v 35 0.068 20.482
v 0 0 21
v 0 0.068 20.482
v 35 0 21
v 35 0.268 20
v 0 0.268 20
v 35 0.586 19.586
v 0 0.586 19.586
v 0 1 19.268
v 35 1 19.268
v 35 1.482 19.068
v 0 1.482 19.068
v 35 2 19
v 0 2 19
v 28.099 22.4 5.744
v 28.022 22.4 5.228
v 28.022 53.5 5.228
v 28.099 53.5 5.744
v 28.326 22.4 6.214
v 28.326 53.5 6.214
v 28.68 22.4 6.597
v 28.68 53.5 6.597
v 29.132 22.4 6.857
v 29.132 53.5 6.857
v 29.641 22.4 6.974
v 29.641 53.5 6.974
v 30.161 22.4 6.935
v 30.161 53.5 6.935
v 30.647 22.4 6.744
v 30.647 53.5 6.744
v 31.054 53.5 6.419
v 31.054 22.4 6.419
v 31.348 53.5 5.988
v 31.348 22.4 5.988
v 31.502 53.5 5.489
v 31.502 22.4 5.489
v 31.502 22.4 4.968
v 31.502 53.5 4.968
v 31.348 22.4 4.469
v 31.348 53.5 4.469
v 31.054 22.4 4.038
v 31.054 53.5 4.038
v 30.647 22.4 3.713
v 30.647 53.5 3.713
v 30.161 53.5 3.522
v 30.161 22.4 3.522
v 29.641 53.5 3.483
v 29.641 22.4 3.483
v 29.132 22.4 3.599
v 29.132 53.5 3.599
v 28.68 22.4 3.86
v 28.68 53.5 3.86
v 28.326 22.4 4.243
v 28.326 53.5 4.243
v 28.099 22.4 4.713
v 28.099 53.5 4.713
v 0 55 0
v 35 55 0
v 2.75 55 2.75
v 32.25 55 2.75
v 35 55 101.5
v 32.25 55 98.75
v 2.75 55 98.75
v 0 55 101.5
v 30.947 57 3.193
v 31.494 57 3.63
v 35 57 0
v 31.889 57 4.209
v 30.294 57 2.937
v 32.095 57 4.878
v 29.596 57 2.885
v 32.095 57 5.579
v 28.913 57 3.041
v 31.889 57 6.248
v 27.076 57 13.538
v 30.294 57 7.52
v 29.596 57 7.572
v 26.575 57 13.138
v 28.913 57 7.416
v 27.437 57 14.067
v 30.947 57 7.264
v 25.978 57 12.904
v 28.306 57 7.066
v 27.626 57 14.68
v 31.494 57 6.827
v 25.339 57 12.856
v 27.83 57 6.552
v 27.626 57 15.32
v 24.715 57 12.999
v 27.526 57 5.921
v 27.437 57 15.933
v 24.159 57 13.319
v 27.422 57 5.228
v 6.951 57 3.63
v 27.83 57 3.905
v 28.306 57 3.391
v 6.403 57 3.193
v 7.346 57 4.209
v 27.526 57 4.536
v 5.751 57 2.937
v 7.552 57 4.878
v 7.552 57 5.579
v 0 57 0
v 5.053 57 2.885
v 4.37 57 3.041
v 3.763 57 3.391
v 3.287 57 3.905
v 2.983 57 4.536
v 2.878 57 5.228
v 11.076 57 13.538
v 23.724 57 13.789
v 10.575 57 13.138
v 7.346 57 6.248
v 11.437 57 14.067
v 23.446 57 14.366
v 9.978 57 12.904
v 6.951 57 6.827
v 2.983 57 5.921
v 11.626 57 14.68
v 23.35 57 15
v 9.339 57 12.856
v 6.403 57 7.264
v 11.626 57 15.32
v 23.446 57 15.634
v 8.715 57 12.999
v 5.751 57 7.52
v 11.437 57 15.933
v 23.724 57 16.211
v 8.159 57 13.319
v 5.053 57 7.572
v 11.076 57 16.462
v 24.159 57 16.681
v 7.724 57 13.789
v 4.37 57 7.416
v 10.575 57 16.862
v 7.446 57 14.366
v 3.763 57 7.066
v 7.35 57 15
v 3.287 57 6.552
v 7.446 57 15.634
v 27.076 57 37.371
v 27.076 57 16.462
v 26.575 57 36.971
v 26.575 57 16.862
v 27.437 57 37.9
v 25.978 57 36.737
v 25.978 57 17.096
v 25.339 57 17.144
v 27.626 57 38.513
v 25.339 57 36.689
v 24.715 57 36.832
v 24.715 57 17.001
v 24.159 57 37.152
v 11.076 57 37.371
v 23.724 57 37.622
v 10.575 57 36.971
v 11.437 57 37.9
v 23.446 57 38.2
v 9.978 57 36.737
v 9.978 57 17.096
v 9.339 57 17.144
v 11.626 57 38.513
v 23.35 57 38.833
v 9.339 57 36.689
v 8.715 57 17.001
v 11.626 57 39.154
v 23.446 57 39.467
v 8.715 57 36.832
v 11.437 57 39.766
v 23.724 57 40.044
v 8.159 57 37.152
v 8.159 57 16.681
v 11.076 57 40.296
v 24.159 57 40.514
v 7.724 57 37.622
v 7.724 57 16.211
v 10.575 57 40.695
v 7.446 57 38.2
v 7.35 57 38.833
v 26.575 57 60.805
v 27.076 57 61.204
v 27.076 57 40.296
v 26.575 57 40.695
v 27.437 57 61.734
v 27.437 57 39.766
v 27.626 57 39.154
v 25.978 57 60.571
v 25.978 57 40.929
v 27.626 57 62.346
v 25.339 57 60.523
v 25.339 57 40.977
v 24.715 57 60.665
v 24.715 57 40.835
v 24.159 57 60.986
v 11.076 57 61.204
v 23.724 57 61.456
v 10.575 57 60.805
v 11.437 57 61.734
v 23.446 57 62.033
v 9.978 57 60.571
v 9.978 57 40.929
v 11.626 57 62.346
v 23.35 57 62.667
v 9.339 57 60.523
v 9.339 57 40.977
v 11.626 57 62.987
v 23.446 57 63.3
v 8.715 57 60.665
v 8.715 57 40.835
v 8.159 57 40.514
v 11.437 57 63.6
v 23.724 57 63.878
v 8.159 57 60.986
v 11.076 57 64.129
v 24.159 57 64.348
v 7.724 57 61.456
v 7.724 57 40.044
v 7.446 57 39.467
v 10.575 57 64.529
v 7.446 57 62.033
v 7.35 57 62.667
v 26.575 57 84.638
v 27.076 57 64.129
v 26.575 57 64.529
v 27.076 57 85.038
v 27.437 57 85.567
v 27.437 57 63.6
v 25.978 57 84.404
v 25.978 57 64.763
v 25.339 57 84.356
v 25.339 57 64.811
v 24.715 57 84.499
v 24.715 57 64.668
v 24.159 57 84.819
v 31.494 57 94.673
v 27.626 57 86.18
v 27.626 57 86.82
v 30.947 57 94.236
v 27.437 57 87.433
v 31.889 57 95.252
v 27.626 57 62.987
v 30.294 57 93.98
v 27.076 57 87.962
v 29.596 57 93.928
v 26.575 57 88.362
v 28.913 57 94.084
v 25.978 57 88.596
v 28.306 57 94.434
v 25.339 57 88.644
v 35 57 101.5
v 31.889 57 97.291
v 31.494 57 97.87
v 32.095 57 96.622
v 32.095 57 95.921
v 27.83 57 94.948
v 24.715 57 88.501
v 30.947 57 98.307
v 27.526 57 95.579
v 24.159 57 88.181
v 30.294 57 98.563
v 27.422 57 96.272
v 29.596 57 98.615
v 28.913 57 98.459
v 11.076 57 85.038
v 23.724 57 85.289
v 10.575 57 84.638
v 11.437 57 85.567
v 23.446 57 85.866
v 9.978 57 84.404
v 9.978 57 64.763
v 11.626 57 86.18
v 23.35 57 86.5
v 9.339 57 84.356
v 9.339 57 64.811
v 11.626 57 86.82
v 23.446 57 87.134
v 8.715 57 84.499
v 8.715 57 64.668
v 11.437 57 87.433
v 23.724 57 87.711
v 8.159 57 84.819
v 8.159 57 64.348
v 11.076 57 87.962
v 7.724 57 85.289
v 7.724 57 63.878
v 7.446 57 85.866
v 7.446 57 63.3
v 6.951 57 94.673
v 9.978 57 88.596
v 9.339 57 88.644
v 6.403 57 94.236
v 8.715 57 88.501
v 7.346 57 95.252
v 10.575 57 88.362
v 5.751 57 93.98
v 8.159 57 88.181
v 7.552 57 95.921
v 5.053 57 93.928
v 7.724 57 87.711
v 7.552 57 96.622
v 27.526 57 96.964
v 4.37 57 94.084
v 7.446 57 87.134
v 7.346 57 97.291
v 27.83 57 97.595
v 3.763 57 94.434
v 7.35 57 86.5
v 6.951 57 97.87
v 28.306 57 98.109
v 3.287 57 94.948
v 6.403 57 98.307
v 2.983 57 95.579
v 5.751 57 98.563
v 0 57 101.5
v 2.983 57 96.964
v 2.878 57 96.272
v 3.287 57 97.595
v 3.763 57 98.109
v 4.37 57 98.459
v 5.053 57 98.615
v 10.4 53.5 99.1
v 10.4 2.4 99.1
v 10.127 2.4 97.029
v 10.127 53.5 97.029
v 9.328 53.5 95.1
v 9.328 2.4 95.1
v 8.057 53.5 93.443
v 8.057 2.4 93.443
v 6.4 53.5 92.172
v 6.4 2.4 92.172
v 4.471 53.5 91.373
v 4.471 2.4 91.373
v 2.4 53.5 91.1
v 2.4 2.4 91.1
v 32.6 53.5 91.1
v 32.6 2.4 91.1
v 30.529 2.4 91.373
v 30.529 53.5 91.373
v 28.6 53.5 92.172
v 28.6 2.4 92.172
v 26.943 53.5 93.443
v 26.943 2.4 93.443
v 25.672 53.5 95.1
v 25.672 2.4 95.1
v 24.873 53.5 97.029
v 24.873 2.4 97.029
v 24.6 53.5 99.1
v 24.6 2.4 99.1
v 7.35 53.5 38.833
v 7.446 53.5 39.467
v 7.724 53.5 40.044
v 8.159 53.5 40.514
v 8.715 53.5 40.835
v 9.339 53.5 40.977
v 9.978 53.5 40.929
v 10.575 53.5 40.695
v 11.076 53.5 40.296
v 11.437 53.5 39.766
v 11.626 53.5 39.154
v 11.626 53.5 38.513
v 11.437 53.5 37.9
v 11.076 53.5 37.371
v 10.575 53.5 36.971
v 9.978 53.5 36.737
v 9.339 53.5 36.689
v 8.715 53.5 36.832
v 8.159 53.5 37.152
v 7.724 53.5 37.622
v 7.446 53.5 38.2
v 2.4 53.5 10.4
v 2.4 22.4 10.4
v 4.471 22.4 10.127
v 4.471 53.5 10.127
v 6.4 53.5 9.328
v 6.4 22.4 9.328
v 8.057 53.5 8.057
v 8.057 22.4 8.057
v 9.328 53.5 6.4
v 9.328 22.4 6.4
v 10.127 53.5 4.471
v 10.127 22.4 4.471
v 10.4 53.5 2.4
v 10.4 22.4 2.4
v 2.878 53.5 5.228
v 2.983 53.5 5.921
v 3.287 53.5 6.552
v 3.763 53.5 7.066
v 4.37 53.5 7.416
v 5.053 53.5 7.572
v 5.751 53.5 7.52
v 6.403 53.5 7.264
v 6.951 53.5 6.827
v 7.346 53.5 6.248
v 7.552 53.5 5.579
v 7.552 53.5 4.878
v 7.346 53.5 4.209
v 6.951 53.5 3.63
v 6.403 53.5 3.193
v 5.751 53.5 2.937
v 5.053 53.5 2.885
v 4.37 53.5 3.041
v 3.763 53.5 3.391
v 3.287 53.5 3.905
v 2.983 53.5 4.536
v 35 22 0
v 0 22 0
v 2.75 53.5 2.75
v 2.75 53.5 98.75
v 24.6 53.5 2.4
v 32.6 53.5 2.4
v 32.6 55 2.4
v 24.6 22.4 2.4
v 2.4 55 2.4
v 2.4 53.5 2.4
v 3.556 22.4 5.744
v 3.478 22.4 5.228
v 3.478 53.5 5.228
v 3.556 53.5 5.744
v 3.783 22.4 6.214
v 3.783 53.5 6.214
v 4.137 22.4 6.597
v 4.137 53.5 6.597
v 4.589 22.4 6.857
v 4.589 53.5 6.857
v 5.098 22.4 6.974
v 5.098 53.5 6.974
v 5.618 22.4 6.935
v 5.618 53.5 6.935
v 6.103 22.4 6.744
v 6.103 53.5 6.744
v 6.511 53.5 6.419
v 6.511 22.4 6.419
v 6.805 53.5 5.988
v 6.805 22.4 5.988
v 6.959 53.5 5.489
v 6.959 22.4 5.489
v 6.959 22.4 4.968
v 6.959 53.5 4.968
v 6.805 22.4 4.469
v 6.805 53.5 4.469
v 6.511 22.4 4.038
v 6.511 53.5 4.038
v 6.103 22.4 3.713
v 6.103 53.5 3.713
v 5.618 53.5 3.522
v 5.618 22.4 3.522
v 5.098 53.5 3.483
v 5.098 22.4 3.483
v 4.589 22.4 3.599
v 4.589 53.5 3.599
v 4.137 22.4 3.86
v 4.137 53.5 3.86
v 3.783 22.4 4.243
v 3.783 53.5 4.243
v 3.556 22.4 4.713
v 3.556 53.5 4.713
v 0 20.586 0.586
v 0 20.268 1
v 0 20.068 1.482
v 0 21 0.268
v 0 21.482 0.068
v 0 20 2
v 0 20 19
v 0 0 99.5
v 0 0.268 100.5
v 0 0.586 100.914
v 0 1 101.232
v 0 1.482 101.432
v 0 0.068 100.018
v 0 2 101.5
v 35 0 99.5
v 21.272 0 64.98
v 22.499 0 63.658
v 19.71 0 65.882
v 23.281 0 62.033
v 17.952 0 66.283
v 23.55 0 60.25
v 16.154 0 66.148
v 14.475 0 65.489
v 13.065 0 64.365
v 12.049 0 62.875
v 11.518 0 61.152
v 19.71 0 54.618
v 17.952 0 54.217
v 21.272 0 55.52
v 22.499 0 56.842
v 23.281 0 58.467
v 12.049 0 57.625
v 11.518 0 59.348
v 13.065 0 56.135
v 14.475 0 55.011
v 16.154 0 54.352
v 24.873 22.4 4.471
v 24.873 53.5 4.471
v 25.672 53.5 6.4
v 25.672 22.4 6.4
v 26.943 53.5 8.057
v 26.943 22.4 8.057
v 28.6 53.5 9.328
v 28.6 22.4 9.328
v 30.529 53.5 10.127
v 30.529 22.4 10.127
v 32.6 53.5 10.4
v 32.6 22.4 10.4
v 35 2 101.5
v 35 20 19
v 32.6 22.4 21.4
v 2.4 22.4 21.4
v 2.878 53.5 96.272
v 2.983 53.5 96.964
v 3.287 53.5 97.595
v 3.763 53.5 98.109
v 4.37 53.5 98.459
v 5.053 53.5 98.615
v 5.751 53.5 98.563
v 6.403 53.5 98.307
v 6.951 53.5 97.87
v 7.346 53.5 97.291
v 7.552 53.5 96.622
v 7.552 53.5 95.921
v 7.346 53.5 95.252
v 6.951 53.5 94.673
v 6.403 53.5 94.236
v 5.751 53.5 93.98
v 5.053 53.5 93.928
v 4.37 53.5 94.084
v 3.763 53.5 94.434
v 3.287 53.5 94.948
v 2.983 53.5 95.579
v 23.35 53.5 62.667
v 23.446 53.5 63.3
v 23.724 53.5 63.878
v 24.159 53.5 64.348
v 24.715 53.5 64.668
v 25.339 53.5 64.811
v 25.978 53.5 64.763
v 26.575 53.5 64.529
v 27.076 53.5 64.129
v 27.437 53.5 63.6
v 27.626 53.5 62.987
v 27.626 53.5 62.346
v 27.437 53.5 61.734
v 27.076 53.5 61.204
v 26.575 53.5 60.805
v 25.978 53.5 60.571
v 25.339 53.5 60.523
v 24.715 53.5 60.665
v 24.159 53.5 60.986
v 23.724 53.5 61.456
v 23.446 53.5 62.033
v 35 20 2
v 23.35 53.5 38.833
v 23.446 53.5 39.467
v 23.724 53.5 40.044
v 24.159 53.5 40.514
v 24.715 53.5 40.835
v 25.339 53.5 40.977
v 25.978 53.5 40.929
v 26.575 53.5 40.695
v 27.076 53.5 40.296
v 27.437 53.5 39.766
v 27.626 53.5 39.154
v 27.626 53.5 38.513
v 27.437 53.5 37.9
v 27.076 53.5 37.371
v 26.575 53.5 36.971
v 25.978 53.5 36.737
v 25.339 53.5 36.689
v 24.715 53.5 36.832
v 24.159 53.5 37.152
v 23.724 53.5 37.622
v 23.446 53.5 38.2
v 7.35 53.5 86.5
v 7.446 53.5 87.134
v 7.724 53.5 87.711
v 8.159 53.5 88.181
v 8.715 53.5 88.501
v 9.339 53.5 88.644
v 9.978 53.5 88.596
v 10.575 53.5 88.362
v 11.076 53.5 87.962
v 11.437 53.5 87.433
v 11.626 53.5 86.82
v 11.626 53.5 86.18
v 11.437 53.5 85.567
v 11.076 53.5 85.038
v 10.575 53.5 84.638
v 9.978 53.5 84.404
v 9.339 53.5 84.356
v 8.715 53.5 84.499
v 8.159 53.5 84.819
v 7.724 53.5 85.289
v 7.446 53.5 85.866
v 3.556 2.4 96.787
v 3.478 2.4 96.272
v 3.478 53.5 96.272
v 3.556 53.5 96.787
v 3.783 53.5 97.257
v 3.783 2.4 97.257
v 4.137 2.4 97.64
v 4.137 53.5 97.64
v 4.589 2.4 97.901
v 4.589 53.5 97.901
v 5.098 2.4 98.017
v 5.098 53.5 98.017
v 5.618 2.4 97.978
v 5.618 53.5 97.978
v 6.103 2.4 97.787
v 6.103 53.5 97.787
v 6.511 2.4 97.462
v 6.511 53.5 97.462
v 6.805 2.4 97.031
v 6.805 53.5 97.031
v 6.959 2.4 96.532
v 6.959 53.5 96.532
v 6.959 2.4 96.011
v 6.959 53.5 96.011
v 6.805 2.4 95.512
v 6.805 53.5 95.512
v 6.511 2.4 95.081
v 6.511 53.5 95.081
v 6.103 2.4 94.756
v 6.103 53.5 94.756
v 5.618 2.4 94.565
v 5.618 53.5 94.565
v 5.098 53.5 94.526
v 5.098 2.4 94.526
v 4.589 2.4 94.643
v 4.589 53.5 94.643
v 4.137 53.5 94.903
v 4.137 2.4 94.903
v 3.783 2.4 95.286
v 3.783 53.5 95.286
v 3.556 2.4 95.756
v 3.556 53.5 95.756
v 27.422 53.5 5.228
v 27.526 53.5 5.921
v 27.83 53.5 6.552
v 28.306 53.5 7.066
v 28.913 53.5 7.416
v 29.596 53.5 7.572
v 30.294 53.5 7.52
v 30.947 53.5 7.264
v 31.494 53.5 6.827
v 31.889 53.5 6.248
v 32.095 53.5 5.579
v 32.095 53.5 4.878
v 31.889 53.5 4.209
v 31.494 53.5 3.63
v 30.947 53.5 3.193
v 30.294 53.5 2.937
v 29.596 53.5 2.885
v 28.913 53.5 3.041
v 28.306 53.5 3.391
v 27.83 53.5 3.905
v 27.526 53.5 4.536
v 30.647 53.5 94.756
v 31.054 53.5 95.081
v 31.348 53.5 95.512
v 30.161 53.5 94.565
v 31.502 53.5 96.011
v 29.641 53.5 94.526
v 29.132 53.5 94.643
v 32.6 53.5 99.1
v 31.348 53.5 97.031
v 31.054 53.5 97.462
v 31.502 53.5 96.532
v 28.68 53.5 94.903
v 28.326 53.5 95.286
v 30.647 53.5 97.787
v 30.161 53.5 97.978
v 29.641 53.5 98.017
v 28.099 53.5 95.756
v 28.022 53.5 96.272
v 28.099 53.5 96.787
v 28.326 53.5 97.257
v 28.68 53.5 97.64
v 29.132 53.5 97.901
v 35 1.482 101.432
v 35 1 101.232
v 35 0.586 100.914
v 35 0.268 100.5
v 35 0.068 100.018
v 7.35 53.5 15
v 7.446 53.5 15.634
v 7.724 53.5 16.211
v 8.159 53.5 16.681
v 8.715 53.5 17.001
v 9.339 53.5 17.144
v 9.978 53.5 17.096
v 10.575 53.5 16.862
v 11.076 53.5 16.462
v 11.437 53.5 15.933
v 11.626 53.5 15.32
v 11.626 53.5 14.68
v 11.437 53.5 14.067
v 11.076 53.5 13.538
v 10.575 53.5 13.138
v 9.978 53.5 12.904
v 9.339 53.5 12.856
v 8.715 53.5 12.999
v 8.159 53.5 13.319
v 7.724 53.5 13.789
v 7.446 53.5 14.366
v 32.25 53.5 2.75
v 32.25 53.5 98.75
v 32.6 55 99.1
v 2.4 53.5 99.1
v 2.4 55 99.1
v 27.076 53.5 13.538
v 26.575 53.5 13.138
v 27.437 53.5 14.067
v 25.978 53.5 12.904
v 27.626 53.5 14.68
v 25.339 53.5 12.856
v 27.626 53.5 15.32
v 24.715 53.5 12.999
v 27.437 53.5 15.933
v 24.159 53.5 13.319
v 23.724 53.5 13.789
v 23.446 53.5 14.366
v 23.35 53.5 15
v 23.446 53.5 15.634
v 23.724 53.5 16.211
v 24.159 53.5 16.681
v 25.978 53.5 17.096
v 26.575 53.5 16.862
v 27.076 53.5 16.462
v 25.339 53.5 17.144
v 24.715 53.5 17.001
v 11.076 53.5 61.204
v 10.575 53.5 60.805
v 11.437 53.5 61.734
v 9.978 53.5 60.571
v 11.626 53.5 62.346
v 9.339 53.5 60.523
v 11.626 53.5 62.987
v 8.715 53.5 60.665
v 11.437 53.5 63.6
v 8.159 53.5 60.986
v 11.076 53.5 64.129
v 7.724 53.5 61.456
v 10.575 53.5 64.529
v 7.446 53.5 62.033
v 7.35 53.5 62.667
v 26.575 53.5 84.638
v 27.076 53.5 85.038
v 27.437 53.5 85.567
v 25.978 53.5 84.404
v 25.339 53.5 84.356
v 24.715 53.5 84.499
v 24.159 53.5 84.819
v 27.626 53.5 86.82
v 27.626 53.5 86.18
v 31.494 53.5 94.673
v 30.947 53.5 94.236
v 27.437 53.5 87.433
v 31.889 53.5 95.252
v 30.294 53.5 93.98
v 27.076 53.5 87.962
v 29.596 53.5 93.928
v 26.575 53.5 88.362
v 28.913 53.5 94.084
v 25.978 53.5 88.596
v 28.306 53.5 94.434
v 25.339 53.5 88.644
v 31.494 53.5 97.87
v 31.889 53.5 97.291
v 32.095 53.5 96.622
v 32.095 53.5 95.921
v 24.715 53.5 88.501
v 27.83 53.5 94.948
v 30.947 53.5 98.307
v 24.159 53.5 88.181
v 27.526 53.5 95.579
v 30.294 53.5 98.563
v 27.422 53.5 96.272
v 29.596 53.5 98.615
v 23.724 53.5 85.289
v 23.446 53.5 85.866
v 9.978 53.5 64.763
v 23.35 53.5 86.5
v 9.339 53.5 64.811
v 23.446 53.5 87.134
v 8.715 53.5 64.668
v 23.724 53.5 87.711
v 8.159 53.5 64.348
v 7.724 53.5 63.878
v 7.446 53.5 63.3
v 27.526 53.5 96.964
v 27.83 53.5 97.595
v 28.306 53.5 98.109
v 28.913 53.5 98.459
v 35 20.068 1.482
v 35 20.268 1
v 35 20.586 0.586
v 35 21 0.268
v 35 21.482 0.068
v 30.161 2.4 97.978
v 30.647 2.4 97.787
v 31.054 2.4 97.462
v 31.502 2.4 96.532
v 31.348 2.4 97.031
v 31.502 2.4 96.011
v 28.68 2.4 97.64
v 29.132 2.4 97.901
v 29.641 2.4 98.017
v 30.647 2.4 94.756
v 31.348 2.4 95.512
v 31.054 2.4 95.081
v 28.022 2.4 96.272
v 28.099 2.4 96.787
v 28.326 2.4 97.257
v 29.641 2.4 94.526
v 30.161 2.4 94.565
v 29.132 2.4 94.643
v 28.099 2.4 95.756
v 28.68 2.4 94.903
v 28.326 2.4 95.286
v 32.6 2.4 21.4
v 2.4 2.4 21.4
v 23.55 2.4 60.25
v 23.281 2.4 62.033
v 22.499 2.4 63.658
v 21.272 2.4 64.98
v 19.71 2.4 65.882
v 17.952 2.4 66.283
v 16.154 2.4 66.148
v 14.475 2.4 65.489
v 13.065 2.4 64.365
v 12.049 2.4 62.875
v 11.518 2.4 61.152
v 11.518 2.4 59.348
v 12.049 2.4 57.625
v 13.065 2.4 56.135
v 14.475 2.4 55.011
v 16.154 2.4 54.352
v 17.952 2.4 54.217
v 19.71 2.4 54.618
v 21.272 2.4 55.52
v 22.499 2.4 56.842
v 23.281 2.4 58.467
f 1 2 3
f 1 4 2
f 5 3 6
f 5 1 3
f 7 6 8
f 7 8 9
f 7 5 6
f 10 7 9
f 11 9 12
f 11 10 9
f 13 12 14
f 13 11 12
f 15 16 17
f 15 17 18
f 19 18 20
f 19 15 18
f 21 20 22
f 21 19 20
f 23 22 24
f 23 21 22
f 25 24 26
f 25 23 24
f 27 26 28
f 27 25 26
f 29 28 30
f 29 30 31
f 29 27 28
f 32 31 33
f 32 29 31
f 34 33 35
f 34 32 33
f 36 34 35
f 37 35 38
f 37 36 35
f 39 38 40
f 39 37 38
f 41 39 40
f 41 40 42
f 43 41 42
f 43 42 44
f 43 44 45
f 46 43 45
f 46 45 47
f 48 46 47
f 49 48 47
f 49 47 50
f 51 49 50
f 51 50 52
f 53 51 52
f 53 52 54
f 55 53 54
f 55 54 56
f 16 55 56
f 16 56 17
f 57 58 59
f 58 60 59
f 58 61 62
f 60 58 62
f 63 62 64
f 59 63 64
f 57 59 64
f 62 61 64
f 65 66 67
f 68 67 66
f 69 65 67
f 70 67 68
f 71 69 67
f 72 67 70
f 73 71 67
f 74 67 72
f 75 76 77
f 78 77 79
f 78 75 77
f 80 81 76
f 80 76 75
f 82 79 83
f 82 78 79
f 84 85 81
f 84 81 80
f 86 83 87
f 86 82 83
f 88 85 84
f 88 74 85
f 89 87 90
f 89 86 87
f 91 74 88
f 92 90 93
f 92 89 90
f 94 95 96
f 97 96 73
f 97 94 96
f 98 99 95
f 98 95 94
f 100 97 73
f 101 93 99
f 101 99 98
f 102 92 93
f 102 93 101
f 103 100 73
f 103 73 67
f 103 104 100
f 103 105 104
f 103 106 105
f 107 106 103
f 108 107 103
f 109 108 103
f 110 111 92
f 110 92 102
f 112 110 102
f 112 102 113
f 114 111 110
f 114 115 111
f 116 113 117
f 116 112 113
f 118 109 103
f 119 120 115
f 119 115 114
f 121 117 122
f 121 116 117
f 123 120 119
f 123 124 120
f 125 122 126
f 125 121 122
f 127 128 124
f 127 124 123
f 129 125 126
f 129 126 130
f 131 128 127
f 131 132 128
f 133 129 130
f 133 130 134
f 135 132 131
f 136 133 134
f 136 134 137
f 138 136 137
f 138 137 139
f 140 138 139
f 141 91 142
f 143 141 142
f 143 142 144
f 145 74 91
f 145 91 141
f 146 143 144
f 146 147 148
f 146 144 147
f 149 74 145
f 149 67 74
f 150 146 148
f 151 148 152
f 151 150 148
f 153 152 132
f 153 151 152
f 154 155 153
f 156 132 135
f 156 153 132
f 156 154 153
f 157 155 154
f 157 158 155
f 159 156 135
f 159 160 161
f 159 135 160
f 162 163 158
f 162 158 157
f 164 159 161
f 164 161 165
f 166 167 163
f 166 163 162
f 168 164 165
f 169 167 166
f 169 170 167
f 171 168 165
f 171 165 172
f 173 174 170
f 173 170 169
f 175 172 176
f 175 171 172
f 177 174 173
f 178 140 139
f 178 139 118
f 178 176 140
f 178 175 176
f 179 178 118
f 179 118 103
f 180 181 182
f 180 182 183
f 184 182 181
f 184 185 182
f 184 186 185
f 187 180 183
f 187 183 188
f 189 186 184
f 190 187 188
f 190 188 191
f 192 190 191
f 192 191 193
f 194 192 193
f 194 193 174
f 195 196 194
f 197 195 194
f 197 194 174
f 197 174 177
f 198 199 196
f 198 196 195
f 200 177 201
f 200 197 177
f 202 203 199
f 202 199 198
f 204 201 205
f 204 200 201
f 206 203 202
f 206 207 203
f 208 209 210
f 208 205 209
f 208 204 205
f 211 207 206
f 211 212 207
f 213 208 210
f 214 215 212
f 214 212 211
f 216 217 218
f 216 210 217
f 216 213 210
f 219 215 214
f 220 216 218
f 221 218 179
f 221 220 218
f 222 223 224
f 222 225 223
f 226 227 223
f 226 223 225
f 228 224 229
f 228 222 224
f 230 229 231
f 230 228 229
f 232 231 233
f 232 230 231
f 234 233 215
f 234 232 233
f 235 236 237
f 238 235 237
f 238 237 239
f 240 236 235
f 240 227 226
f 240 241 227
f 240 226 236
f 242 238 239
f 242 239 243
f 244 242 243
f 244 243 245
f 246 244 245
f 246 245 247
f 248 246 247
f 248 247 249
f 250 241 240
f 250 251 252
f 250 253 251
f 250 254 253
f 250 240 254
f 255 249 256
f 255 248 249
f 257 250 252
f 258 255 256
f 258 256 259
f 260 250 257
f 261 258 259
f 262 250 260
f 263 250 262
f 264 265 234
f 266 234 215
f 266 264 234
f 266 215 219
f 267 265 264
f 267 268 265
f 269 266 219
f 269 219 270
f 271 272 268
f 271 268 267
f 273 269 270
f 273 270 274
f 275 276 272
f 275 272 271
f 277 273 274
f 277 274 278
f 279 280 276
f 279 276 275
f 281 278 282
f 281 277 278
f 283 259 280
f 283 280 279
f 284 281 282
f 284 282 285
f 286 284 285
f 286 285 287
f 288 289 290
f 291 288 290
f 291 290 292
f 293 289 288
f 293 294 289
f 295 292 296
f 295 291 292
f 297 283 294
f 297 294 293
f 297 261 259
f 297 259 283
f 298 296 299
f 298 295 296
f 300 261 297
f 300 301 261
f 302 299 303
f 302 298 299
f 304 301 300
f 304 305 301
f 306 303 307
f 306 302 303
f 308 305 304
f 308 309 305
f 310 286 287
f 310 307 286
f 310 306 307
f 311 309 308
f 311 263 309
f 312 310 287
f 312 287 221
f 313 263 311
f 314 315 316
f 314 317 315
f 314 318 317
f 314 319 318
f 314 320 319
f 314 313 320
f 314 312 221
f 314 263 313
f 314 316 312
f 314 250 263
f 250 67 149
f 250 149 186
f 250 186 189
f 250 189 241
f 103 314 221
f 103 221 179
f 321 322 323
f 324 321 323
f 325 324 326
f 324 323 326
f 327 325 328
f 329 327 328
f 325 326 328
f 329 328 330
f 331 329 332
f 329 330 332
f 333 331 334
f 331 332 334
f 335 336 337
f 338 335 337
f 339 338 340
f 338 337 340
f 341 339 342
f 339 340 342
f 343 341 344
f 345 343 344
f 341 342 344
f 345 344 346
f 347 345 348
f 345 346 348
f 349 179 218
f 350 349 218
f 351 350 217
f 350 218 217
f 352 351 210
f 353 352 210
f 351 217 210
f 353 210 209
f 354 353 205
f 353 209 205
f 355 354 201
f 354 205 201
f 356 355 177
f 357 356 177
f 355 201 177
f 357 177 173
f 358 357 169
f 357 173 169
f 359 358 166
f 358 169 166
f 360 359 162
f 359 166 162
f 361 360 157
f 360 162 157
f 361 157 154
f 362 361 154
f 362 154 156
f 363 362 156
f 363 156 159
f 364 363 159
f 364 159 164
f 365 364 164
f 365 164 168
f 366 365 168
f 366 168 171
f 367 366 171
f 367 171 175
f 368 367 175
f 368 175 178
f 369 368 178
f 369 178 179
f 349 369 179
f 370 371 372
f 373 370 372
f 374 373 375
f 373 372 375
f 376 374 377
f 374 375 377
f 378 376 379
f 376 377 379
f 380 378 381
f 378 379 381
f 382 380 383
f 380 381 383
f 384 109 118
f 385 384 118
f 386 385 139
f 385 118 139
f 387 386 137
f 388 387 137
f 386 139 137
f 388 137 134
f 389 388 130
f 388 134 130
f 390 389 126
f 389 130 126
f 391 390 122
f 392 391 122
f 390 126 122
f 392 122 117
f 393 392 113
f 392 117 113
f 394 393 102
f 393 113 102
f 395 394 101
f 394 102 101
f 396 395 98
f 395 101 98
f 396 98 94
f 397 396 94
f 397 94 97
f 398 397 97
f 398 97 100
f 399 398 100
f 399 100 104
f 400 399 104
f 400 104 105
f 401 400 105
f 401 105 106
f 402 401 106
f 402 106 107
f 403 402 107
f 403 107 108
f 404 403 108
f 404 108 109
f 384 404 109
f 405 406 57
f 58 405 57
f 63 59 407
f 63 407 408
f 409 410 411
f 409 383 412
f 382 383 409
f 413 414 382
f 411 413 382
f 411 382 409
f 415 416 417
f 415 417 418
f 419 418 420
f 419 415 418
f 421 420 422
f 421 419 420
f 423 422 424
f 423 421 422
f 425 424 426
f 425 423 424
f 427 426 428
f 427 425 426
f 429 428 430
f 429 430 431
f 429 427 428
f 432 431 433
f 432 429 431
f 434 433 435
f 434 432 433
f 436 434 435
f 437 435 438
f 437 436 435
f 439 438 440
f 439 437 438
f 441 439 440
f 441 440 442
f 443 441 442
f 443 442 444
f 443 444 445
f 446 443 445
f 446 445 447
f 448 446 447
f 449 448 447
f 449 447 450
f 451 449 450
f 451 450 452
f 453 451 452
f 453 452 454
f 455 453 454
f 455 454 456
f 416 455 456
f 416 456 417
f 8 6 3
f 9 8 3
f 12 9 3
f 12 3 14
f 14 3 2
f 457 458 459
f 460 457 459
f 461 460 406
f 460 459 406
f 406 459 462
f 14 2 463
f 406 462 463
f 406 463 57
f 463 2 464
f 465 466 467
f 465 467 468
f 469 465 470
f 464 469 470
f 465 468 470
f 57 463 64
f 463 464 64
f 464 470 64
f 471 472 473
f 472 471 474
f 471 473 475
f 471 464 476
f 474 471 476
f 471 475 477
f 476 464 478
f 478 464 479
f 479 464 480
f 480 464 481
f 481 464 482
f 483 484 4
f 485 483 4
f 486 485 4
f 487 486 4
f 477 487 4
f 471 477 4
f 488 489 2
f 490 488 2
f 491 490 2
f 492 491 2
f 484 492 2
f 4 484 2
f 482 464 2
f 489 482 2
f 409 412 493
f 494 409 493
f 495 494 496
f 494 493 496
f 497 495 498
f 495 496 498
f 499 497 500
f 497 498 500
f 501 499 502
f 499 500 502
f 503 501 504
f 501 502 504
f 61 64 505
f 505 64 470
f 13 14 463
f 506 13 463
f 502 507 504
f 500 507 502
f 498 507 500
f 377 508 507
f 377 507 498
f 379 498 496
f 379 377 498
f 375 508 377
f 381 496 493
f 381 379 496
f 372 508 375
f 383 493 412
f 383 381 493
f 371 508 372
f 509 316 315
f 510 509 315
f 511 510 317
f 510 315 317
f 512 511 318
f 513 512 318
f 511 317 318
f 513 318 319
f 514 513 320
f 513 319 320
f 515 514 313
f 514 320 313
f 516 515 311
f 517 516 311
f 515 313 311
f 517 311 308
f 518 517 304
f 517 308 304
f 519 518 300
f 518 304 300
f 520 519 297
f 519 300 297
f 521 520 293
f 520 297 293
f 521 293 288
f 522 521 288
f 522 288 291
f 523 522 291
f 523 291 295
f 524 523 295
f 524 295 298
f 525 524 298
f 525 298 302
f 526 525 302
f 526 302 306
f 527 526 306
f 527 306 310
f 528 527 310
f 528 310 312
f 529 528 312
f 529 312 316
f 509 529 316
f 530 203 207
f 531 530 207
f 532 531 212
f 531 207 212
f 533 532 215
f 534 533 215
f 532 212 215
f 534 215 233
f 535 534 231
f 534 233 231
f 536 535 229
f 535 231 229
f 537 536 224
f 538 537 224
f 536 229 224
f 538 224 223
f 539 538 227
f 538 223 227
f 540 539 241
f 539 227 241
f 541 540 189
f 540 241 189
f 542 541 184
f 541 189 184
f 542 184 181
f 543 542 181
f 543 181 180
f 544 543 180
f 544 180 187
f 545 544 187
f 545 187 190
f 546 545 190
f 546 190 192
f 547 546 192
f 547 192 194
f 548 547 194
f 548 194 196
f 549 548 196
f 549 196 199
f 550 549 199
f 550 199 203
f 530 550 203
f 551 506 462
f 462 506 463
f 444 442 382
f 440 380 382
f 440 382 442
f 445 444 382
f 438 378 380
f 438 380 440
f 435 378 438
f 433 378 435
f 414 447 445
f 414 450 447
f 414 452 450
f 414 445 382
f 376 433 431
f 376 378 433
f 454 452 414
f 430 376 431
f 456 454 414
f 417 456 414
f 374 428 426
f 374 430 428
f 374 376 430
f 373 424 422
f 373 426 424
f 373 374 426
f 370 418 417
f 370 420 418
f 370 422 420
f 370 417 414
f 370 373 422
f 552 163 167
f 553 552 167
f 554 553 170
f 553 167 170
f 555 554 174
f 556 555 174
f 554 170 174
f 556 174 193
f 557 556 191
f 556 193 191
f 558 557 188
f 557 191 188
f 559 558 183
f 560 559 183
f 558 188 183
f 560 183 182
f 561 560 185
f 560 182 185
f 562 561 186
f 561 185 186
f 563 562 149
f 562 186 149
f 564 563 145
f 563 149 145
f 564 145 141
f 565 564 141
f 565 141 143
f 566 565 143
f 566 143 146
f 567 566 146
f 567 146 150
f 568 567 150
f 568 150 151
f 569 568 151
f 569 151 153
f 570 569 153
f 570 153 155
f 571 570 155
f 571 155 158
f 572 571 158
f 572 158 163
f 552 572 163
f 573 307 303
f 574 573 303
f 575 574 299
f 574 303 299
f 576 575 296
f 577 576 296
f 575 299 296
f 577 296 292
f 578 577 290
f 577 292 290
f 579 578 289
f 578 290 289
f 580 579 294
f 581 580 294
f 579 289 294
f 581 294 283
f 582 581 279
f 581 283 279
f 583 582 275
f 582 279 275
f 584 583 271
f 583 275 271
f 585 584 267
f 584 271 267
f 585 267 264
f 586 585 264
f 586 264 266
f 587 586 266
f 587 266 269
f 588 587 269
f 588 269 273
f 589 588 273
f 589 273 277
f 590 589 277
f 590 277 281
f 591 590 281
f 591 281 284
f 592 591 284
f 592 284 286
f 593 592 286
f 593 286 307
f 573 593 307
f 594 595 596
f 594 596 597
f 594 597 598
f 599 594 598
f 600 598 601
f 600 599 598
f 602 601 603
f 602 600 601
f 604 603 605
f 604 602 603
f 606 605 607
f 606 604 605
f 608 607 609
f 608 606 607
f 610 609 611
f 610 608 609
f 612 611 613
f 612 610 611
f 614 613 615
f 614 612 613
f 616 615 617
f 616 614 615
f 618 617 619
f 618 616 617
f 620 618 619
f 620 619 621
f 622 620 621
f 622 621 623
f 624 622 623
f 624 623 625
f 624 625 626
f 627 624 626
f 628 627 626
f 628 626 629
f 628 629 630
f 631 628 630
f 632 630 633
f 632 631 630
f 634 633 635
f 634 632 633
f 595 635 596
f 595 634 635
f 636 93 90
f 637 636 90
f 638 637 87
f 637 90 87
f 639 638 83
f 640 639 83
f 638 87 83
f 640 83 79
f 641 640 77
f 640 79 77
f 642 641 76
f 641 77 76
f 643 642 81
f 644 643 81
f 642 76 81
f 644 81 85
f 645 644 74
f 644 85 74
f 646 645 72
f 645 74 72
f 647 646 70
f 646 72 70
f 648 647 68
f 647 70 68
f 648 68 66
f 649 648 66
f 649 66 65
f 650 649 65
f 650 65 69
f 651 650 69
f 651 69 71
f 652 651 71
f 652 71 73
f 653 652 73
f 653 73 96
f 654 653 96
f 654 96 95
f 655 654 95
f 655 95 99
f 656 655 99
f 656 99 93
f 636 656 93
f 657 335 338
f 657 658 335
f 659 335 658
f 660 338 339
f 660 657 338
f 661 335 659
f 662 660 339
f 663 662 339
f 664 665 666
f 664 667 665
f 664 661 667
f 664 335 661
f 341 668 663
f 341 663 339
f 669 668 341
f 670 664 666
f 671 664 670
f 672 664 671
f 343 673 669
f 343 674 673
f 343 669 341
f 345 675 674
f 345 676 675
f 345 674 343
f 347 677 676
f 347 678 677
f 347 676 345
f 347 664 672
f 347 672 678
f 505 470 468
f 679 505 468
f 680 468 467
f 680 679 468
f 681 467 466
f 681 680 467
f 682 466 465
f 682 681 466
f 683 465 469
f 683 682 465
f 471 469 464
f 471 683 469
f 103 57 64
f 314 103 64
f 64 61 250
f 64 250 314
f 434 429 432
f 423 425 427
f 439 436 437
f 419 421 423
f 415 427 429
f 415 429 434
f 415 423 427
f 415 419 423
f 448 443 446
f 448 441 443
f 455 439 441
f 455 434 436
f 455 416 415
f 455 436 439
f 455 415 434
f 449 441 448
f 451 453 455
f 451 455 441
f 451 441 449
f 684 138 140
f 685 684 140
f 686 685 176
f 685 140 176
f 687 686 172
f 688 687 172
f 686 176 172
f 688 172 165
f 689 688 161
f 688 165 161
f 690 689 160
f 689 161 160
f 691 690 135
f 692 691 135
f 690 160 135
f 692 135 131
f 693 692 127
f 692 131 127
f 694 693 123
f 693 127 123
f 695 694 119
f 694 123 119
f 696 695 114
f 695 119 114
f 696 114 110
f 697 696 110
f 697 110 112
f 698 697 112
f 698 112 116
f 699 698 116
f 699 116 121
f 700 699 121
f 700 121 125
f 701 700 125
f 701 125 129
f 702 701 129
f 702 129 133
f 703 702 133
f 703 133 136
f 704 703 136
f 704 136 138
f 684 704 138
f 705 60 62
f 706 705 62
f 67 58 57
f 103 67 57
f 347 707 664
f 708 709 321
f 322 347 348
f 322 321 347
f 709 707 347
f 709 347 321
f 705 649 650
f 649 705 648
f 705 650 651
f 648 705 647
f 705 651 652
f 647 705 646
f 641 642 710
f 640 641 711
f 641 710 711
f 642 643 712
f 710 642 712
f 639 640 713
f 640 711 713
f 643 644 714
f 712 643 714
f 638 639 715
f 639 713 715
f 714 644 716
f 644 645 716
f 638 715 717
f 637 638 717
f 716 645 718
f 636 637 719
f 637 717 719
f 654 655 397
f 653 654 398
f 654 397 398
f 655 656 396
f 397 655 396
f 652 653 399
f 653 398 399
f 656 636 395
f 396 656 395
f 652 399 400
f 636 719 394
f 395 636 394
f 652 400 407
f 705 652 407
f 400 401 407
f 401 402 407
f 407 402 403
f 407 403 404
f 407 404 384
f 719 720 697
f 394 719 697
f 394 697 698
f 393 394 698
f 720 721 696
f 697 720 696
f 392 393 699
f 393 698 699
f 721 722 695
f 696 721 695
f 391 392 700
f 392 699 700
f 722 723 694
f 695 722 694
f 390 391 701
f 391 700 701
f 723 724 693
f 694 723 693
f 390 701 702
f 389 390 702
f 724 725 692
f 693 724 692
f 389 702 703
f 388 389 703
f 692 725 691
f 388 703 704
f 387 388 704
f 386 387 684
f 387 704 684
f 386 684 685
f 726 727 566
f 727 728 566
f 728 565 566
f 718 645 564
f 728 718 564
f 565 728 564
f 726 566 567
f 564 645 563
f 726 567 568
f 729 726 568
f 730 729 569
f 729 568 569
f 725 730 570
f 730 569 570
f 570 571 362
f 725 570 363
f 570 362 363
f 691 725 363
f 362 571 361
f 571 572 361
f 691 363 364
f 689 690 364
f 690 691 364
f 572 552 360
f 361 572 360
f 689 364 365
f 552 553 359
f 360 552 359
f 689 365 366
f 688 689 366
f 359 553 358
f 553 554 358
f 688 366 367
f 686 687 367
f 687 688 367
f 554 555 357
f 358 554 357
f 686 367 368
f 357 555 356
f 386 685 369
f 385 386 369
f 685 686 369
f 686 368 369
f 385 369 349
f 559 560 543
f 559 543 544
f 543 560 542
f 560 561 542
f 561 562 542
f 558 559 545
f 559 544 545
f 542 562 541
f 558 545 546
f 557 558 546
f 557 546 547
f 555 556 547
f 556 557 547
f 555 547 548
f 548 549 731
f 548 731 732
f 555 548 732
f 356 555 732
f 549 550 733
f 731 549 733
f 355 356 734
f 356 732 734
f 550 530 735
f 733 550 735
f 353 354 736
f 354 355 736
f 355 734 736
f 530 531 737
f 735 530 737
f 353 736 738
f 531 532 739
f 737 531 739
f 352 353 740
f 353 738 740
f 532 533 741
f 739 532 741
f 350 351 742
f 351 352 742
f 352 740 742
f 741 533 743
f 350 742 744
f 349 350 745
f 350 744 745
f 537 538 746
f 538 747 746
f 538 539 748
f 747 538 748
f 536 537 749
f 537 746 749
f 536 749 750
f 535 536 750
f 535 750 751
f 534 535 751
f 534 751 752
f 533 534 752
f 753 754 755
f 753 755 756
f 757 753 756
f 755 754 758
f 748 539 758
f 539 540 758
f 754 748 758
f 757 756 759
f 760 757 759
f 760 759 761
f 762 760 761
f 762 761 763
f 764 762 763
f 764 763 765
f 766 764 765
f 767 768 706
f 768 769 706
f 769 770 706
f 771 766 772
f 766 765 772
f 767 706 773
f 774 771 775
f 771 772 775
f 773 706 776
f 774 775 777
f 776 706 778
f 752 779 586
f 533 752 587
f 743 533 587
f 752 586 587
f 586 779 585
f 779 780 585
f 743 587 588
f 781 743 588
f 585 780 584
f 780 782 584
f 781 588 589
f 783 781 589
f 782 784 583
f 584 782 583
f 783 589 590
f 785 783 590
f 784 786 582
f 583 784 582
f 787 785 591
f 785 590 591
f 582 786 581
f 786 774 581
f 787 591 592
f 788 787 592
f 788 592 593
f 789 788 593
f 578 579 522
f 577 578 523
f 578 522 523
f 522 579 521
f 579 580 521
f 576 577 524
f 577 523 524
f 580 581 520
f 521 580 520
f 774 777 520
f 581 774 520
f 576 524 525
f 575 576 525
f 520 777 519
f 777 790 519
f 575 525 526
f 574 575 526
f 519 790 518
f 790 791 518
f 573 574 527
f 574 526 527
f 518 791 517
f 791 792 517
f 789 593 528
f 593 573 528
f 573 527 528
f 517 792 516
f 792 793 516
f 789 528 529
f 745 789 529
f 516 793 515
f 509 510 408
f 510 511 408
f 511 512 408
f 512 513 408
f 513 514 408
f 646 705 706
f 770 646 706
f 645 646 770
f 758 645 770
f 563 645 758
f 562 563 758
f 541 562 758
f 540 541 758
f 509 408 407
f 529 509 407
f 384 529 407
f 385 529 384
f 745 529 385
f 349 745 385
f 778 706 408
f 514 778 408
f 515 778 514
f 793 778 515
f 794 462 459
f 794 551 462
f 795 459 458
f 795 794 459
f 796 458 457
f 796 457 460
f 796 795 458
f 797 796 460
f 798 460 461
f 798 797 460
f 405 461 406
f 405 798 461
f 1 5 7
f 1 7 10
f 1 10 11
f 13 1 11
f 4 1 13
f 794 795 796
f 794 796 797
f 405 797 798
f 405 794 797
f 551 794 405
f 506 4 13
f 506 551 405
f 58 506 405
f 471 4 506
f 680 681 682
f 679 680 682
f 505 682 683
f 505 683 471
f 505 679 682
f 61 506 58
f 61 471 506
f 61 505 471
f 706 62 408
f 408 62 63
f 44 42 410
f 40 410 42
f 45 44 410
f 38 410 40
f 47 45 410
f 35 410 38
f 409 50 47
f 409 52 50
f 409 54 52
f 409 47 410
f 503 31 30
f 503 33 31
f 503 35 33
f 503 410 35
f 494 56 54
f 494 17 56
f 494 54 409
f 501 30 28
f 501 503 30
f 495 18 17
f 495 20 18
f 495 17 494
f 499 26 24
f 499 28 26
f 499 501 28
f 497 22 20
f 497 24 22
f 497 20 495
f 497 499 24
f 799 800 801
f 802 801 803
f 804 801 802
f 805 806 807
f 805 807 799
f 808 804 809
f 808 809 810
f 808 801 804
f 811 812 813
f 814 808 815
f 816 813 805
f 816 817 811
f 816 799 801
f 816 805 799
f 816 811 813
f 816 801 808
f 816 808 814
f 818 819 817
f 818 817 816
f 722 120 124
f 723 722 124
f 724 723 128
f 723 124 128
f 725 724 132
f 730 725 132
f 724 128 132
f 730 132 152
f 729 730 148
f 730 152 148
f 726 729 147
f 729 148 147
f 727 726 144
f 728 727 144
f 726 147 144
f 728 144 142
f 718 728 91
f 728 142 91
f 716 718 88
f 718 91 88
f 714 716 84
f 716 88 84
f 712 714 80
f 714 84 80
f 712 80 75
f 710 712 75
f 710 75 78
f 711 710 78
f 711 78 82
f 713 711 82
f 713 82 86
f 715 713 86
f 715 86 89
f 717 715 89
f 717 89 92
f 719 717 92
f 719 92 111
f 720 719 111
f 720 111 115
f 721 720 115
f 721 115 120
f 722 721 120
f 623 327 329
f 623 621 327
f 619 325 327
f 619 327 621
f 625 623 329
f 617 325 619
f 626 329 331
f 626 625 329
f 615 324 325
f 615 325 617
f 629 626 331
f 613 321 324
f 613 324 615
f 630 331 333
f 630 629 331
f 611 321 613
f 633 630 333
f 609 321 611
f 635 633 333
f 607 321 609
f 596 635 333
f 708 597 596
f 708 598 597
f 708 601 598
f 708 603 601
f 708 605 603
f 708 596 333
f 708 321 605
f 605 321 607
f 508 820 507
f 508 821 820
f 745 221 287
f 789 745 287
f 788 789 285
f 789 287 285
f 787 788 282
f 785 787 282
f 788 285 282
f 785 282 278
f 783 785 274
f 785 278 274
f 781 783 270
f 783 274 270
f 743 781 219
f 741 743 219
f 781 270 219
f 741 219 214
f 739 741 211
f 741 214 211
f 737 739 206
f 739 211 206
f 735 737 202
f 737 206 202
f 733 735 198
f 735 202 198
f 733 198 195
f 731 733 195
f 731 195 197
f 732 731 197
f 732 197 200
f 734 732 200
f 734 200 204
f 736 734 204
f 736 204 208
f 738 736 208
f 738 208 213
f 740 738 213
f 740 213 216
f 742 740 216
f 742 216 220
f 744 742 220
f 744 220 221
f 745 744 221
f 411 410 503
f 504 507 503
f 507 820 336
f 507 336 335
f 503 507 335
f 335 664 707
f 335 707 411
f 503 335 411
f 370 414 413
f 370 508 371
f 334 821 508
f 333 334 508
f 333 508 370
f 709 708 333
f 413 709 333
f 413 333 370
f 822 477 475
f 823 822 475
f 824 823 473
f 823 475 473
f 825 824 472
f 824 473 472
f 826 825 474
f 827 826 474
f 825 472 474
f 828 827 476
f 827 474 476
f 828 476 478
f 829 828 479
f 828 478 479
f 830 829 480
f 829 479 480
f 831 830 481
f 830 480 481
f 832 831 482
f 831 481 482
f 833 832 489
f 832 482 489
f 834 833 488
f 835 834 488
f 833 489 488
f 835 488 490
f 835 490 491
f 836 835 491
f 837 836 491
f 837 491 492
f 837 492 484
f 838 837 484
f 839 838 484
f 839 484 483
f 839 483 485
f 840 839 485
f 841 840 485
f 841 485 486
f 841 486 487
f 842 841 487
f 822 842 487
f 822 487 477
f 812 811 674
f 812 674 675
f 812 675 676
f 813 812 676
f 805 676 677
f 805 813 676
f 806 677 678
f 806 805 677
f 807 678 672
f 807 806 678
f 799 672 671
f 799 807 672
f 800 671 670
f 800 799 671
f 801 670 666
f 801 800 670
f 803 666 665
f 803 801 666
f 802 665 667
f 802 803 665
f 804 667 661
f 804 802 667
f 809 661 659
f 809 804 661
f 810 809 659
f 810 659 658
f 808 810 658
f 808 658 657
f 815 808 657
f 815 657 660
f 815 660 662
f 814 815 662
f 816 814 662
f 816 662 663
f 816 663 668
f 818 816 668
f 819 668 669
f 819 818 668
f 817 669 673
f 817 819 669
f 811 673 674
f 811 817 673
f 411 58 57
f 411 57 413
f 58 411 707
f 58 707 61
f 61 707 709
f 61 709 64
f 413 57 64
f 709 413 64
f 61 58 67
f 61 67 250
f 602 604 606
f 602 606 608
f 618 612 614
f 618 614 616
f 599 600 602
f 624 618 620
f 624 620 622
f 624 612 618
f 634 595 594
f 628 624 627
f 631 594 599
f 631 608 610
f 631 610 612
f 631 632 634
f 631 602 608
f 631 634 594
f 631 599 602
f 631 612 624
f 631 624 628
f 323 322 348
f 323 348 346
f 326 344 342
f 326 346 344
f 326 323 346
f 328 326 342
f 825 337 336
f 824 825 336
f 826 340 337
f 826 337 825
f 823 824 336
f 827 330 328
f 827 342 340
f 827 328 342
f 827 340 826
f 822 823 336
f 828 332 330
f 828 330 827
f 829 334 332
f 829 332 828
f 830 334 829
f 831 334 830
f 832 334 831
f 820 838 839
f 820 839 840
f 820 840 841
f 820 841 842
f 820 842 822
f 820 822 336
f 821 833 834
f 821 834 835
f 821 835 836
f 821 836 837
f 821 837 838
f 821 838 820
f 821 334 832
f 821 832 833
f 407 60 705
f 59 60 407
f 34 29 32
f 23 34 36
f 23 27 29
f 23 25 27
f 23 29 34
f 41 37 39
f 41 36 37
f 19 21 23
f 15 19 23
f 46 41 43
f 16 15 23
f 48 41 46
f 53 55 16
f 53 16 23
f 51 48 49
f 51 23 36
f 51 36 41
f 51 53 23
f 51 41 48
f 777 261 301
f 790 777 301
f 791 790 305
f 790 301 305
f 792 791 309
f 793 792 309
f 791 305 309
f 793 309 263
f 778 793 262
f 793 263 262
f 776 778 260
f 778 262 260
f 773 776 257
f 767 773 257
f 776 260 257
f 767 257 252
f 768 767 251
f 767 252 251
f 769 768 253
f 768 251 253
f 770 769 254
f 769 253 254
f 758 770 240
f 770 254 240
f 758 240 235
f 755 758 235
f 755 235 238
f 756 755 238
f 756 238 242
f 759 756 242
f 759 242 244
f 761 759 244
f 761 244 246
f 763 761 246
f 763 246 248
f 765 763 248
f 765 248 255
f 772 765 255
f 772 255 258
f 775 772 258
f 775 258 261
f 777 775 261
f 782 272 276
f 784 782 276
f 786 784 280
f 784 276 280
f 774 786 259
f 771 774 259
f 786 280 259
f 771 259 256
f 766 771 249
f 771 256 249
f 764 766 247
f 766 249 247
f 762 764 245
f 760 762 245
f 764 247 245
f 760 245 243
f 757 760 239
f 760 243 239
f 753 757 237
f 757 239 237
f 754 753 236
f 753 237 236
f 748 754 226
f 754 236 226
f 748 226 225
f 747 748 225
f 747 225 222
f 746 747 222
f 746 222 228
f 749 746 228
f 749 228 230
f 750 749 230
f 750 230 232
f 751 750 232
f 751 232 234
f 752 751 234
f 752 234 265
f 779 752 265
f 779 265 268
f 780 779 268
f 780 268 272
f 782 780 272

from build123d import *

# Parameters (mm, degrees)
F1_DEPTH  = 35
F2_R      = 2
F3_T      = -2.4
F4_R      = 6.05
F5_DEPTH  = 55.001
F6_W      = 29.5
F6_H      = 96
F7_DEPTH  = 1.5
F6_W_2    = 35
F6_H_2    = 101.5
F6_W_3    = 30.2
F6_H_3    = 96.7
F8_DEPTH  = 2
F9_R      = 1.75
F10_DEPTH = 51.1
F11_START = 17.6
F11_DEPTH = 33.5
F12_R     = 2.35
F13_DEPTH = 57.001
F14_R     = 2.15
F15_DEPTH = 57.001


with BuildPart() as f1:
    # F0 (on Right) → F1 (new body)
    with BuildSketch(Plane.YZ):
        Polygon((20, 19), (20, 0), (55, 0), (55, 101.5), (0, 101.5), (0, 19), align=None)
    extrude(amount=F1_DEPTH)

    # F2
    f2_edges = [f1.edges().sort_by_distance(p)[0] for p in [
        (17.5, 0, 101.5),
        (17.5, 0, 19),
        (17.5, 20, 0),
    ]]
    fillet(f2_edges, radius=F2_R)

    # F3
    f3_openings = [f1.faces().sort_by_distance(p)[0] for p in [
        (17.5, 55, 50.75),
    ]]
    offset(amount=F3_T, openings=f3_openings, kind=Kind.INTERSECTION)

    # F4 (on face) → F5 (cut, through all)
    with BuildSketch(Plane.XZ):
        with Locations((17.5, 60.25)):
            Circle(F4_R)
    extrude(amount=-F5_DEPTH, mode=Mode.SUBTRACT)

    # F9 (on face) → F10 (join, through all)
    with BuildSketch(Plane(origin=(0, 2.4, 0), x_dir=(-1, 0, 0), z_dir=(0, 1, 0))):
        with BuildLine():
            Line((-2.4, 99.1), (-10.4, 99.1))
            ThreePointArc((-10.4, 99.1), (-8.0568542495, 93.4431457505), (-2.4, 91.1))
            Line((-2.4, 91.1), (-2.4, 99.1))
        make_face()
        with Locations((-5.2284271247, 96.2715728753)):
            Circle(F9_R, mode=Mode.SUBTRACT)
        with BuildLine():
            Line((-24.6, 99.1), (-32.6, 99.1))
            Line((-32.6, 99.1), (-32.6, 91.1))
            ThreePointArc((-32.6, 91.1), (-26.9431457505, 93.4431457505), (-24.6, 99.1))
        make_face()
        with Locations((-29.7715728753, 96.2715728753)):
            Circle(F9_R, mode=Mode.SUBTRACT)
    extrude(amount=F10_DEPTH)

    # F9 (on face) → F11 (join)
    with BuildSketch(Plane(origin=(0, 2.4, 0), x_dir=(-1, 0, 0), z_dir=(0, 1, 0)).offset(F11_START)):
        with BuildLine():
            ThreePointArc((-24.6, 2.4), (-26.9431457505, 8.0568542495), (-32.6, 10.4))
            Line((-32.6, 10.4), (-32.6, 2.4))
            Line((-32.6, 2.4), (-24.6, 2.4))
        make_face()
        with Locations((-29.7715728753, 5.2284271247)):
            Circle(F9_R, mode=Mode.SUBTRACT)
        with BuildLine():
            Line((-2.4, 2.4), (-2.4, 10.4))
            ThreePointArc((-2.4, 10.4), (-8.0568542495, 8.0568542495), (-10.4, 2.4))
            Line((-10.4, 2.4), (-2.4, 2.4))
        make_face()
        with Locations((-5.2284271247, 5.2284271247)):
            Circle(F9_R, mode=Mode.SUBTRACT)
    extrude(amount=F11_DEPTH)


with BuildPart() as f7:
    # F6 (on face) → F7 (new body)
    with BuildSketch(Plane(origin=(0, 55, 0), x_dir=(-1, 0, 0), z_dir=(0, 1, 0))):
        with Locations((-17.5, 50.75)):
            Rectangle(F6_W, F6_H)
    extrude(amount=-F7_DEPTH)

    # F6 (on face) → F8 (join)
    with BuildSketch(Plane(origin=(0, 55, 0), x_dir=(-1, 0, 0), z_dir=(0, 1, 0))):
        with Locations((-17.5, 50.75)):
            Rectangle(F6_W_2, F6_H_2)
        with Locations((-17.5, 50.75)):
            Rectangle(F6_W_3, F6_H_3, mode=Mode.SUBTRACT)
        with Locations((-17.5, 50.75)):
            Rectangle(F6_W_3, F6_H_3)
        with Locations((-17.5, 50.75)):
            Rectangle(F6_W, F6_H, mode=Mode.SUBTRACT)
        with Locations((-17.5, 50.75)):
            Rectangle(F6_W, F6_H)
    extrude(amount=F8_DEPTH)

    # F12 (on face) → F13 (cut, through all)
    with BuildSketch(Plane(origin=(0, 57, 0), x_dir=(-1, 0, 0), z_dir=(0, 1, 0))):
        with Locations((-5.2284271247, 96.2715728753)):
            Circle(F12_R)
        with Locations((-29.7715728753, 96.2715728753)):
            Circle(F12_R)
        with Locations((-29.7715728753, 5.2284271247)):
            Circle(F12_R)
        with Locations((-5.2284271247, 5.2284271247)):
            Circle(F12_R)
    extrude(amount=-F13_DEPTH, mode=Mode.SUBTRACT)

    # F14 (on face) → F15 (cut, through all)
    with BuildSketch(Plane(origin=(0, 57, 0), x_dir=(-1, 0, 0), z_dir=(0, 1, 0))):
        with Locations((-25.5, 86.5)):
            Circle(F14_R)
        with Locations((-9.5, 86.5)):
            Circle(F14_R)
        with Locations((-25.5, 62.6666666667)):
            Circle(F14_R)
        with Locations((-9.5, 62.6666666667)):
            Circle(F14_R)
        with Locations((-25.5, 38.8333333333)):
            Circle(F14_R)
        with Locations((-9.5, 38.8333333333)):
            Circle(F14_R)
        with Locations((-25.5, 15)):
            Circle(F14_R)
        with Locations((-9.5, 15)):
            Circle(F14_R)
    extrude(amount=-F15_DEPTH, mode=Mode.SUBTRACT)


solid = Compound([f1.part, f7.part])
